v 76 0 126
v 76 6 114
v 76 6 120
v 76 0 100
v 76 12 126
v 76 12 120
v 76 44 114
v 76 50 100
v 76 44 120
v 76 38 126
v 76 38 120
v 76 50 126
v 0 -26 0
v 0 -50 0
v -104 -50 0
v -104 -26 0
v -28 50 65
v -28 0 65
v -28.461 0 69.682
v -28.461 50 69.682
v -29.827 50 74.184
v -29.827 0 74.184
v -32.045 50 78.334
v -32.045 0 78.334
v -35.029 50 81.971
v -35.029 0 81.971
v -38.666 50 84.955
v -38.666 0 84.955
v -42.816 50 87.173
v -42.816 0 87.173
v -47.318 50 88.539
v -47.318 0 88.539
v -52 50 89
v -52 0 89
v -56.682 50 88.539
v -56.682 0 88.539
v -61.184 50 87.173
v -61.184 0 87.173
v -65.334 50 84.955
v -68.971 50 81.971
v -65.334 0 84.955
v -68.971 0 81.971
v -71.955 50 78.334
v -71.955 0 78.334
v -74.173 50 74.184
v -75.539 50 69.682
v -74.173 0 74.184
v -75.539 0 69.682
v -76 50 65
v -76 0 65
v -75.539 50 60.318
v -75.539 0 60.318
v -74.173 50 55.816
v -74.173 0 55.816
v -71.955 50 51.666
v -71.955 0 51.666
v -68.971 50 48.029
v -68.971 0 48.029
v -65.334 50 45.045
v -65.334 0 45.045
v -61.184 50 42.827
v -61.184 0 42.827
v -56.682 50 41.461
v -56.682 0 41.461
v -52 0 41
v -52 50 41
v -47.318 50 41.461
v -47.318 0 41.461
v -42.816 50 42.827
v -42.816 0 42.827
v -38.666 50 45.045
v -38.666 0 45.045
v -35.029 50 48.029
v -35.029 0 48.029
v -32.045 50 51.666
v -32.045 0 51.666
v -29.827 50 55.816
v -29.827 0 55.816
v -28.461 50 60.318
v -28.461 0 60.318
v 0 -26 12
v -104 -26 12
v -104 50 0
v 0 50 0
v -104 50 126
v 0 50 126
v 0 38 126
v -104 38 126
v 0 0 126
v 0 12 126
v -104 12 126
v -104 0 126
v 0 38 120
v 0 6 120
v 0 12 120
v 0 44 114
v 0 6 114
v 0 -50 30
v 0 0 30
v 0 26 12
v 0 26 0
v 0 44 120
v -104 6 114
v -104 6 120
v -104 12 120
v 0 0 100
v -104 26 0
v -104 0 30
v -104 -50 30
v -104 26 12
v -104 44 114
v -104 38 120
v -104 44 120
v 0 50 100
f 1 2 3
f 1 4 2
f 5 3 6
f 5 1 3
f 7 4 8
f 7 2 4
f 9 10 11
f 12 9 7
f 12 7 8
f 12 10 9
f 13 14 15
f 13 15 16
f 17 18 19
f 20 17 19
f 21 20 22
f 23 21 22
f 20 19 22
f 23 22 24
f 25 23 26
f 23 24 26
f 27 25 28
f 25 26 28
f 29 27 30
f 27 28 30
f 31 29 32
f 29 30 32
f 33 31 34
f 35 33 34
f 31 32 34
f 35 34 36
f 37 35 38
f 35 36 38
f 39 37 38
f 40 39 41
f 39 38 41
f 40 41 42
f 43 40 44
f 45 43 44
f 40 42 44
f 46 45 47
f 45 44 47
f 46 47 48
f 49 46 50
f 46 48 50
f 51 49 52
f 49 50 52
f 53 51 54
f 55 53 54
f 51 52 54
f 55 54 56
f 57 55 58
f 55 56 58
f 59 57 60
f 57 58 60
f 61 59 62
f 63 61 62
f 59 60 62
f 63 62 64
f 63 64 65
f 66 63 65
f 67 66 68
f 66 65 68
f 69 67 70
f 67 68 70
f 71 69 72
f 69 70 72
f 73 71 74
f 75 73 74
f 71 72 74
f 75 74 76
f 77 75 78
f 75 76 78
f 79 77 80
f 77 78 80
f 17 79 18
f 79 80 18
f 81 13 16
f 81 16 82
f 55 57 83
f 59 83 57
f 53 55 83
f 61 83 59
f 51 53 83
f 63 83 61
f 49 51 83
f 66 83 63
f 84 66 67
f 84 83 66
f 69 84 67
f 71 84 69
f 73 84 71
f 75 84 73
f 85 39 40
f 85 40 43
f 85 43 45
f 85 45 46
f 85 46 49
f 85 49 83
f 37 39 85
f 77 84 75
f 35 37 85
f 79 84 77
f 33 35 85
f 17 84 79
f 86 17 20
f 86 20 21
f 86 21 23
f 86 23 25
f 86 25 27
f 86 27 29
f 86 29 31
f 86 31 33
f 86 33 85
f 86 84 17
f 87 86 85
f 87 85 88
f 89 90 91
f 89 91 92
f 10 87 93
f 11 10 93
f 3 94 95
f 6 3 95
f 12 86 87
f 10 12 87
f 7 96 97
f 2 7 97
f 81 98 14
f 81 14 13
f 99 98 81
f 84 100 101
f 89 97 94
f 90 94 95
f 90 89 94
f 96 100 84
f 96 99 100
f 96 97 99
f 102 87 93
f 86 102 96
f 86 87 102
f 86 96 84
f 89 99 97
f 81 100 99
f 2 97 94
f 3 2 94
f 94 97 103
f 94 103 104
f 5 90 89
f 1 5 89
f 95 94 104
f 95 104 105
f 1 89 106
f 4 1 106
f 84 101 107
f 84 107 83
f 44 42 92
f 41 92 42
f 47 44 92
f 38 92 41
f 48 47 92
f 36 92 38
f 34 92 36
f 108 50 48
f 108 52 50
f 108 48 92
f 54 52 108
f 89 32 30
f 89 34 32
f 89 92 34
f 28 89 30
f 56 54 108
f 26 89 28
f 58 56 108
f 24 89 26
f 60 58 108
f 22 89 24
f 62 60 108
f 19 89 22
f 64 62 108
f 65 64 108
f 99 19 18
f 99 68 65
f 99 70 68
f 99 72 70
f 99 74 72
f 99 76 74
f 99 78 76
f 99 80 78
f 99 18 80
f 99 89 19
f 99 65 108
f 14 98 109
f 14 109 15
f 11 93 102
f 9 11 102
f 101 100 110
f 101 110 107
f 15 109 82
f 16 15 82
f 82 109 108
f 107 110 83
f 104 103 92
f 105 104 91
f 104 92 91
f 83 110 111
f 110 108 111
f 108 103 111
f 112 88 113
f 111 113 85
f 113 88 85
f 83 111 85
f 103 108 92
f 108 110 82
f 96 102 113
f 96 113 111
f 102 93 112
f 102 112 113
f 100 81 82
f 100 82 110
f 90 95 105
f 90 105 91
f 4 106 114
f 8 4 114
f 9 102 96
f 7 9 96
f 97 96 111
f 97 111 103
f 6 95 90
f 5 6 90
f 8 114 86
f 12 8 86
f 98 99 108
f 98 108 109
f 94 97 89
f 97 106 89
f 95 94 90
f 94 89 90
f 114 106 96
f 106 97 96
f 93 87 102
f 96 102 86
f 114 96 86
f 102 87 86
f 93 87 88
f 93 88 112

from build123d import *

# Parameters (mm, degrees)
F1_DEPTH = 104
F2_DEPTH = 76
F3_R     = 24
F4_DEPTH = 50


with BuildPart() as f1:
    # F0 (on Right) → F1 (new body)
    with BuildSketch(Plane.YZ):
        Polygon((26, 12), (26, 0), (50, 0), (50, 100), (0, 100), (0, 30), (-50, 30), (-50, 0), (-26, 0), (-26, 12), align=None)
        Polygon((0, 100), (50, 100), (50, 126), (38, 126), (38, 120), (44, 120), (44, 114), (6, 114), (6, 120), (12, 120), (12, 126), (0, 126), align=None)
    extrude(amount=-F1_DEPTH)

    # F3 (on face) → F4 (cut)
    with BuildSketch(Plane.XZ):
        with Locations((-52, 65)):
            Circle(F3_R)
    extrude(amount=-F4_DEPTH, mode=Mode.SUBTRACT)


with BuildPart() as f2:
    # F0 (on Right) → F2 (new body)
    with BuildSketch(Plane.YZ):
        Polygon((0, 100), (50, 100), (50, 126), (38, 126), (38, 120), (44, 120), (44, 114), (6, 114), (6, 120), (12, 120), (12, 126), (0, 126), align=None)
    extrude(amount=F2_DEPTH)


solid = Compound([f1.part, f2.part])
